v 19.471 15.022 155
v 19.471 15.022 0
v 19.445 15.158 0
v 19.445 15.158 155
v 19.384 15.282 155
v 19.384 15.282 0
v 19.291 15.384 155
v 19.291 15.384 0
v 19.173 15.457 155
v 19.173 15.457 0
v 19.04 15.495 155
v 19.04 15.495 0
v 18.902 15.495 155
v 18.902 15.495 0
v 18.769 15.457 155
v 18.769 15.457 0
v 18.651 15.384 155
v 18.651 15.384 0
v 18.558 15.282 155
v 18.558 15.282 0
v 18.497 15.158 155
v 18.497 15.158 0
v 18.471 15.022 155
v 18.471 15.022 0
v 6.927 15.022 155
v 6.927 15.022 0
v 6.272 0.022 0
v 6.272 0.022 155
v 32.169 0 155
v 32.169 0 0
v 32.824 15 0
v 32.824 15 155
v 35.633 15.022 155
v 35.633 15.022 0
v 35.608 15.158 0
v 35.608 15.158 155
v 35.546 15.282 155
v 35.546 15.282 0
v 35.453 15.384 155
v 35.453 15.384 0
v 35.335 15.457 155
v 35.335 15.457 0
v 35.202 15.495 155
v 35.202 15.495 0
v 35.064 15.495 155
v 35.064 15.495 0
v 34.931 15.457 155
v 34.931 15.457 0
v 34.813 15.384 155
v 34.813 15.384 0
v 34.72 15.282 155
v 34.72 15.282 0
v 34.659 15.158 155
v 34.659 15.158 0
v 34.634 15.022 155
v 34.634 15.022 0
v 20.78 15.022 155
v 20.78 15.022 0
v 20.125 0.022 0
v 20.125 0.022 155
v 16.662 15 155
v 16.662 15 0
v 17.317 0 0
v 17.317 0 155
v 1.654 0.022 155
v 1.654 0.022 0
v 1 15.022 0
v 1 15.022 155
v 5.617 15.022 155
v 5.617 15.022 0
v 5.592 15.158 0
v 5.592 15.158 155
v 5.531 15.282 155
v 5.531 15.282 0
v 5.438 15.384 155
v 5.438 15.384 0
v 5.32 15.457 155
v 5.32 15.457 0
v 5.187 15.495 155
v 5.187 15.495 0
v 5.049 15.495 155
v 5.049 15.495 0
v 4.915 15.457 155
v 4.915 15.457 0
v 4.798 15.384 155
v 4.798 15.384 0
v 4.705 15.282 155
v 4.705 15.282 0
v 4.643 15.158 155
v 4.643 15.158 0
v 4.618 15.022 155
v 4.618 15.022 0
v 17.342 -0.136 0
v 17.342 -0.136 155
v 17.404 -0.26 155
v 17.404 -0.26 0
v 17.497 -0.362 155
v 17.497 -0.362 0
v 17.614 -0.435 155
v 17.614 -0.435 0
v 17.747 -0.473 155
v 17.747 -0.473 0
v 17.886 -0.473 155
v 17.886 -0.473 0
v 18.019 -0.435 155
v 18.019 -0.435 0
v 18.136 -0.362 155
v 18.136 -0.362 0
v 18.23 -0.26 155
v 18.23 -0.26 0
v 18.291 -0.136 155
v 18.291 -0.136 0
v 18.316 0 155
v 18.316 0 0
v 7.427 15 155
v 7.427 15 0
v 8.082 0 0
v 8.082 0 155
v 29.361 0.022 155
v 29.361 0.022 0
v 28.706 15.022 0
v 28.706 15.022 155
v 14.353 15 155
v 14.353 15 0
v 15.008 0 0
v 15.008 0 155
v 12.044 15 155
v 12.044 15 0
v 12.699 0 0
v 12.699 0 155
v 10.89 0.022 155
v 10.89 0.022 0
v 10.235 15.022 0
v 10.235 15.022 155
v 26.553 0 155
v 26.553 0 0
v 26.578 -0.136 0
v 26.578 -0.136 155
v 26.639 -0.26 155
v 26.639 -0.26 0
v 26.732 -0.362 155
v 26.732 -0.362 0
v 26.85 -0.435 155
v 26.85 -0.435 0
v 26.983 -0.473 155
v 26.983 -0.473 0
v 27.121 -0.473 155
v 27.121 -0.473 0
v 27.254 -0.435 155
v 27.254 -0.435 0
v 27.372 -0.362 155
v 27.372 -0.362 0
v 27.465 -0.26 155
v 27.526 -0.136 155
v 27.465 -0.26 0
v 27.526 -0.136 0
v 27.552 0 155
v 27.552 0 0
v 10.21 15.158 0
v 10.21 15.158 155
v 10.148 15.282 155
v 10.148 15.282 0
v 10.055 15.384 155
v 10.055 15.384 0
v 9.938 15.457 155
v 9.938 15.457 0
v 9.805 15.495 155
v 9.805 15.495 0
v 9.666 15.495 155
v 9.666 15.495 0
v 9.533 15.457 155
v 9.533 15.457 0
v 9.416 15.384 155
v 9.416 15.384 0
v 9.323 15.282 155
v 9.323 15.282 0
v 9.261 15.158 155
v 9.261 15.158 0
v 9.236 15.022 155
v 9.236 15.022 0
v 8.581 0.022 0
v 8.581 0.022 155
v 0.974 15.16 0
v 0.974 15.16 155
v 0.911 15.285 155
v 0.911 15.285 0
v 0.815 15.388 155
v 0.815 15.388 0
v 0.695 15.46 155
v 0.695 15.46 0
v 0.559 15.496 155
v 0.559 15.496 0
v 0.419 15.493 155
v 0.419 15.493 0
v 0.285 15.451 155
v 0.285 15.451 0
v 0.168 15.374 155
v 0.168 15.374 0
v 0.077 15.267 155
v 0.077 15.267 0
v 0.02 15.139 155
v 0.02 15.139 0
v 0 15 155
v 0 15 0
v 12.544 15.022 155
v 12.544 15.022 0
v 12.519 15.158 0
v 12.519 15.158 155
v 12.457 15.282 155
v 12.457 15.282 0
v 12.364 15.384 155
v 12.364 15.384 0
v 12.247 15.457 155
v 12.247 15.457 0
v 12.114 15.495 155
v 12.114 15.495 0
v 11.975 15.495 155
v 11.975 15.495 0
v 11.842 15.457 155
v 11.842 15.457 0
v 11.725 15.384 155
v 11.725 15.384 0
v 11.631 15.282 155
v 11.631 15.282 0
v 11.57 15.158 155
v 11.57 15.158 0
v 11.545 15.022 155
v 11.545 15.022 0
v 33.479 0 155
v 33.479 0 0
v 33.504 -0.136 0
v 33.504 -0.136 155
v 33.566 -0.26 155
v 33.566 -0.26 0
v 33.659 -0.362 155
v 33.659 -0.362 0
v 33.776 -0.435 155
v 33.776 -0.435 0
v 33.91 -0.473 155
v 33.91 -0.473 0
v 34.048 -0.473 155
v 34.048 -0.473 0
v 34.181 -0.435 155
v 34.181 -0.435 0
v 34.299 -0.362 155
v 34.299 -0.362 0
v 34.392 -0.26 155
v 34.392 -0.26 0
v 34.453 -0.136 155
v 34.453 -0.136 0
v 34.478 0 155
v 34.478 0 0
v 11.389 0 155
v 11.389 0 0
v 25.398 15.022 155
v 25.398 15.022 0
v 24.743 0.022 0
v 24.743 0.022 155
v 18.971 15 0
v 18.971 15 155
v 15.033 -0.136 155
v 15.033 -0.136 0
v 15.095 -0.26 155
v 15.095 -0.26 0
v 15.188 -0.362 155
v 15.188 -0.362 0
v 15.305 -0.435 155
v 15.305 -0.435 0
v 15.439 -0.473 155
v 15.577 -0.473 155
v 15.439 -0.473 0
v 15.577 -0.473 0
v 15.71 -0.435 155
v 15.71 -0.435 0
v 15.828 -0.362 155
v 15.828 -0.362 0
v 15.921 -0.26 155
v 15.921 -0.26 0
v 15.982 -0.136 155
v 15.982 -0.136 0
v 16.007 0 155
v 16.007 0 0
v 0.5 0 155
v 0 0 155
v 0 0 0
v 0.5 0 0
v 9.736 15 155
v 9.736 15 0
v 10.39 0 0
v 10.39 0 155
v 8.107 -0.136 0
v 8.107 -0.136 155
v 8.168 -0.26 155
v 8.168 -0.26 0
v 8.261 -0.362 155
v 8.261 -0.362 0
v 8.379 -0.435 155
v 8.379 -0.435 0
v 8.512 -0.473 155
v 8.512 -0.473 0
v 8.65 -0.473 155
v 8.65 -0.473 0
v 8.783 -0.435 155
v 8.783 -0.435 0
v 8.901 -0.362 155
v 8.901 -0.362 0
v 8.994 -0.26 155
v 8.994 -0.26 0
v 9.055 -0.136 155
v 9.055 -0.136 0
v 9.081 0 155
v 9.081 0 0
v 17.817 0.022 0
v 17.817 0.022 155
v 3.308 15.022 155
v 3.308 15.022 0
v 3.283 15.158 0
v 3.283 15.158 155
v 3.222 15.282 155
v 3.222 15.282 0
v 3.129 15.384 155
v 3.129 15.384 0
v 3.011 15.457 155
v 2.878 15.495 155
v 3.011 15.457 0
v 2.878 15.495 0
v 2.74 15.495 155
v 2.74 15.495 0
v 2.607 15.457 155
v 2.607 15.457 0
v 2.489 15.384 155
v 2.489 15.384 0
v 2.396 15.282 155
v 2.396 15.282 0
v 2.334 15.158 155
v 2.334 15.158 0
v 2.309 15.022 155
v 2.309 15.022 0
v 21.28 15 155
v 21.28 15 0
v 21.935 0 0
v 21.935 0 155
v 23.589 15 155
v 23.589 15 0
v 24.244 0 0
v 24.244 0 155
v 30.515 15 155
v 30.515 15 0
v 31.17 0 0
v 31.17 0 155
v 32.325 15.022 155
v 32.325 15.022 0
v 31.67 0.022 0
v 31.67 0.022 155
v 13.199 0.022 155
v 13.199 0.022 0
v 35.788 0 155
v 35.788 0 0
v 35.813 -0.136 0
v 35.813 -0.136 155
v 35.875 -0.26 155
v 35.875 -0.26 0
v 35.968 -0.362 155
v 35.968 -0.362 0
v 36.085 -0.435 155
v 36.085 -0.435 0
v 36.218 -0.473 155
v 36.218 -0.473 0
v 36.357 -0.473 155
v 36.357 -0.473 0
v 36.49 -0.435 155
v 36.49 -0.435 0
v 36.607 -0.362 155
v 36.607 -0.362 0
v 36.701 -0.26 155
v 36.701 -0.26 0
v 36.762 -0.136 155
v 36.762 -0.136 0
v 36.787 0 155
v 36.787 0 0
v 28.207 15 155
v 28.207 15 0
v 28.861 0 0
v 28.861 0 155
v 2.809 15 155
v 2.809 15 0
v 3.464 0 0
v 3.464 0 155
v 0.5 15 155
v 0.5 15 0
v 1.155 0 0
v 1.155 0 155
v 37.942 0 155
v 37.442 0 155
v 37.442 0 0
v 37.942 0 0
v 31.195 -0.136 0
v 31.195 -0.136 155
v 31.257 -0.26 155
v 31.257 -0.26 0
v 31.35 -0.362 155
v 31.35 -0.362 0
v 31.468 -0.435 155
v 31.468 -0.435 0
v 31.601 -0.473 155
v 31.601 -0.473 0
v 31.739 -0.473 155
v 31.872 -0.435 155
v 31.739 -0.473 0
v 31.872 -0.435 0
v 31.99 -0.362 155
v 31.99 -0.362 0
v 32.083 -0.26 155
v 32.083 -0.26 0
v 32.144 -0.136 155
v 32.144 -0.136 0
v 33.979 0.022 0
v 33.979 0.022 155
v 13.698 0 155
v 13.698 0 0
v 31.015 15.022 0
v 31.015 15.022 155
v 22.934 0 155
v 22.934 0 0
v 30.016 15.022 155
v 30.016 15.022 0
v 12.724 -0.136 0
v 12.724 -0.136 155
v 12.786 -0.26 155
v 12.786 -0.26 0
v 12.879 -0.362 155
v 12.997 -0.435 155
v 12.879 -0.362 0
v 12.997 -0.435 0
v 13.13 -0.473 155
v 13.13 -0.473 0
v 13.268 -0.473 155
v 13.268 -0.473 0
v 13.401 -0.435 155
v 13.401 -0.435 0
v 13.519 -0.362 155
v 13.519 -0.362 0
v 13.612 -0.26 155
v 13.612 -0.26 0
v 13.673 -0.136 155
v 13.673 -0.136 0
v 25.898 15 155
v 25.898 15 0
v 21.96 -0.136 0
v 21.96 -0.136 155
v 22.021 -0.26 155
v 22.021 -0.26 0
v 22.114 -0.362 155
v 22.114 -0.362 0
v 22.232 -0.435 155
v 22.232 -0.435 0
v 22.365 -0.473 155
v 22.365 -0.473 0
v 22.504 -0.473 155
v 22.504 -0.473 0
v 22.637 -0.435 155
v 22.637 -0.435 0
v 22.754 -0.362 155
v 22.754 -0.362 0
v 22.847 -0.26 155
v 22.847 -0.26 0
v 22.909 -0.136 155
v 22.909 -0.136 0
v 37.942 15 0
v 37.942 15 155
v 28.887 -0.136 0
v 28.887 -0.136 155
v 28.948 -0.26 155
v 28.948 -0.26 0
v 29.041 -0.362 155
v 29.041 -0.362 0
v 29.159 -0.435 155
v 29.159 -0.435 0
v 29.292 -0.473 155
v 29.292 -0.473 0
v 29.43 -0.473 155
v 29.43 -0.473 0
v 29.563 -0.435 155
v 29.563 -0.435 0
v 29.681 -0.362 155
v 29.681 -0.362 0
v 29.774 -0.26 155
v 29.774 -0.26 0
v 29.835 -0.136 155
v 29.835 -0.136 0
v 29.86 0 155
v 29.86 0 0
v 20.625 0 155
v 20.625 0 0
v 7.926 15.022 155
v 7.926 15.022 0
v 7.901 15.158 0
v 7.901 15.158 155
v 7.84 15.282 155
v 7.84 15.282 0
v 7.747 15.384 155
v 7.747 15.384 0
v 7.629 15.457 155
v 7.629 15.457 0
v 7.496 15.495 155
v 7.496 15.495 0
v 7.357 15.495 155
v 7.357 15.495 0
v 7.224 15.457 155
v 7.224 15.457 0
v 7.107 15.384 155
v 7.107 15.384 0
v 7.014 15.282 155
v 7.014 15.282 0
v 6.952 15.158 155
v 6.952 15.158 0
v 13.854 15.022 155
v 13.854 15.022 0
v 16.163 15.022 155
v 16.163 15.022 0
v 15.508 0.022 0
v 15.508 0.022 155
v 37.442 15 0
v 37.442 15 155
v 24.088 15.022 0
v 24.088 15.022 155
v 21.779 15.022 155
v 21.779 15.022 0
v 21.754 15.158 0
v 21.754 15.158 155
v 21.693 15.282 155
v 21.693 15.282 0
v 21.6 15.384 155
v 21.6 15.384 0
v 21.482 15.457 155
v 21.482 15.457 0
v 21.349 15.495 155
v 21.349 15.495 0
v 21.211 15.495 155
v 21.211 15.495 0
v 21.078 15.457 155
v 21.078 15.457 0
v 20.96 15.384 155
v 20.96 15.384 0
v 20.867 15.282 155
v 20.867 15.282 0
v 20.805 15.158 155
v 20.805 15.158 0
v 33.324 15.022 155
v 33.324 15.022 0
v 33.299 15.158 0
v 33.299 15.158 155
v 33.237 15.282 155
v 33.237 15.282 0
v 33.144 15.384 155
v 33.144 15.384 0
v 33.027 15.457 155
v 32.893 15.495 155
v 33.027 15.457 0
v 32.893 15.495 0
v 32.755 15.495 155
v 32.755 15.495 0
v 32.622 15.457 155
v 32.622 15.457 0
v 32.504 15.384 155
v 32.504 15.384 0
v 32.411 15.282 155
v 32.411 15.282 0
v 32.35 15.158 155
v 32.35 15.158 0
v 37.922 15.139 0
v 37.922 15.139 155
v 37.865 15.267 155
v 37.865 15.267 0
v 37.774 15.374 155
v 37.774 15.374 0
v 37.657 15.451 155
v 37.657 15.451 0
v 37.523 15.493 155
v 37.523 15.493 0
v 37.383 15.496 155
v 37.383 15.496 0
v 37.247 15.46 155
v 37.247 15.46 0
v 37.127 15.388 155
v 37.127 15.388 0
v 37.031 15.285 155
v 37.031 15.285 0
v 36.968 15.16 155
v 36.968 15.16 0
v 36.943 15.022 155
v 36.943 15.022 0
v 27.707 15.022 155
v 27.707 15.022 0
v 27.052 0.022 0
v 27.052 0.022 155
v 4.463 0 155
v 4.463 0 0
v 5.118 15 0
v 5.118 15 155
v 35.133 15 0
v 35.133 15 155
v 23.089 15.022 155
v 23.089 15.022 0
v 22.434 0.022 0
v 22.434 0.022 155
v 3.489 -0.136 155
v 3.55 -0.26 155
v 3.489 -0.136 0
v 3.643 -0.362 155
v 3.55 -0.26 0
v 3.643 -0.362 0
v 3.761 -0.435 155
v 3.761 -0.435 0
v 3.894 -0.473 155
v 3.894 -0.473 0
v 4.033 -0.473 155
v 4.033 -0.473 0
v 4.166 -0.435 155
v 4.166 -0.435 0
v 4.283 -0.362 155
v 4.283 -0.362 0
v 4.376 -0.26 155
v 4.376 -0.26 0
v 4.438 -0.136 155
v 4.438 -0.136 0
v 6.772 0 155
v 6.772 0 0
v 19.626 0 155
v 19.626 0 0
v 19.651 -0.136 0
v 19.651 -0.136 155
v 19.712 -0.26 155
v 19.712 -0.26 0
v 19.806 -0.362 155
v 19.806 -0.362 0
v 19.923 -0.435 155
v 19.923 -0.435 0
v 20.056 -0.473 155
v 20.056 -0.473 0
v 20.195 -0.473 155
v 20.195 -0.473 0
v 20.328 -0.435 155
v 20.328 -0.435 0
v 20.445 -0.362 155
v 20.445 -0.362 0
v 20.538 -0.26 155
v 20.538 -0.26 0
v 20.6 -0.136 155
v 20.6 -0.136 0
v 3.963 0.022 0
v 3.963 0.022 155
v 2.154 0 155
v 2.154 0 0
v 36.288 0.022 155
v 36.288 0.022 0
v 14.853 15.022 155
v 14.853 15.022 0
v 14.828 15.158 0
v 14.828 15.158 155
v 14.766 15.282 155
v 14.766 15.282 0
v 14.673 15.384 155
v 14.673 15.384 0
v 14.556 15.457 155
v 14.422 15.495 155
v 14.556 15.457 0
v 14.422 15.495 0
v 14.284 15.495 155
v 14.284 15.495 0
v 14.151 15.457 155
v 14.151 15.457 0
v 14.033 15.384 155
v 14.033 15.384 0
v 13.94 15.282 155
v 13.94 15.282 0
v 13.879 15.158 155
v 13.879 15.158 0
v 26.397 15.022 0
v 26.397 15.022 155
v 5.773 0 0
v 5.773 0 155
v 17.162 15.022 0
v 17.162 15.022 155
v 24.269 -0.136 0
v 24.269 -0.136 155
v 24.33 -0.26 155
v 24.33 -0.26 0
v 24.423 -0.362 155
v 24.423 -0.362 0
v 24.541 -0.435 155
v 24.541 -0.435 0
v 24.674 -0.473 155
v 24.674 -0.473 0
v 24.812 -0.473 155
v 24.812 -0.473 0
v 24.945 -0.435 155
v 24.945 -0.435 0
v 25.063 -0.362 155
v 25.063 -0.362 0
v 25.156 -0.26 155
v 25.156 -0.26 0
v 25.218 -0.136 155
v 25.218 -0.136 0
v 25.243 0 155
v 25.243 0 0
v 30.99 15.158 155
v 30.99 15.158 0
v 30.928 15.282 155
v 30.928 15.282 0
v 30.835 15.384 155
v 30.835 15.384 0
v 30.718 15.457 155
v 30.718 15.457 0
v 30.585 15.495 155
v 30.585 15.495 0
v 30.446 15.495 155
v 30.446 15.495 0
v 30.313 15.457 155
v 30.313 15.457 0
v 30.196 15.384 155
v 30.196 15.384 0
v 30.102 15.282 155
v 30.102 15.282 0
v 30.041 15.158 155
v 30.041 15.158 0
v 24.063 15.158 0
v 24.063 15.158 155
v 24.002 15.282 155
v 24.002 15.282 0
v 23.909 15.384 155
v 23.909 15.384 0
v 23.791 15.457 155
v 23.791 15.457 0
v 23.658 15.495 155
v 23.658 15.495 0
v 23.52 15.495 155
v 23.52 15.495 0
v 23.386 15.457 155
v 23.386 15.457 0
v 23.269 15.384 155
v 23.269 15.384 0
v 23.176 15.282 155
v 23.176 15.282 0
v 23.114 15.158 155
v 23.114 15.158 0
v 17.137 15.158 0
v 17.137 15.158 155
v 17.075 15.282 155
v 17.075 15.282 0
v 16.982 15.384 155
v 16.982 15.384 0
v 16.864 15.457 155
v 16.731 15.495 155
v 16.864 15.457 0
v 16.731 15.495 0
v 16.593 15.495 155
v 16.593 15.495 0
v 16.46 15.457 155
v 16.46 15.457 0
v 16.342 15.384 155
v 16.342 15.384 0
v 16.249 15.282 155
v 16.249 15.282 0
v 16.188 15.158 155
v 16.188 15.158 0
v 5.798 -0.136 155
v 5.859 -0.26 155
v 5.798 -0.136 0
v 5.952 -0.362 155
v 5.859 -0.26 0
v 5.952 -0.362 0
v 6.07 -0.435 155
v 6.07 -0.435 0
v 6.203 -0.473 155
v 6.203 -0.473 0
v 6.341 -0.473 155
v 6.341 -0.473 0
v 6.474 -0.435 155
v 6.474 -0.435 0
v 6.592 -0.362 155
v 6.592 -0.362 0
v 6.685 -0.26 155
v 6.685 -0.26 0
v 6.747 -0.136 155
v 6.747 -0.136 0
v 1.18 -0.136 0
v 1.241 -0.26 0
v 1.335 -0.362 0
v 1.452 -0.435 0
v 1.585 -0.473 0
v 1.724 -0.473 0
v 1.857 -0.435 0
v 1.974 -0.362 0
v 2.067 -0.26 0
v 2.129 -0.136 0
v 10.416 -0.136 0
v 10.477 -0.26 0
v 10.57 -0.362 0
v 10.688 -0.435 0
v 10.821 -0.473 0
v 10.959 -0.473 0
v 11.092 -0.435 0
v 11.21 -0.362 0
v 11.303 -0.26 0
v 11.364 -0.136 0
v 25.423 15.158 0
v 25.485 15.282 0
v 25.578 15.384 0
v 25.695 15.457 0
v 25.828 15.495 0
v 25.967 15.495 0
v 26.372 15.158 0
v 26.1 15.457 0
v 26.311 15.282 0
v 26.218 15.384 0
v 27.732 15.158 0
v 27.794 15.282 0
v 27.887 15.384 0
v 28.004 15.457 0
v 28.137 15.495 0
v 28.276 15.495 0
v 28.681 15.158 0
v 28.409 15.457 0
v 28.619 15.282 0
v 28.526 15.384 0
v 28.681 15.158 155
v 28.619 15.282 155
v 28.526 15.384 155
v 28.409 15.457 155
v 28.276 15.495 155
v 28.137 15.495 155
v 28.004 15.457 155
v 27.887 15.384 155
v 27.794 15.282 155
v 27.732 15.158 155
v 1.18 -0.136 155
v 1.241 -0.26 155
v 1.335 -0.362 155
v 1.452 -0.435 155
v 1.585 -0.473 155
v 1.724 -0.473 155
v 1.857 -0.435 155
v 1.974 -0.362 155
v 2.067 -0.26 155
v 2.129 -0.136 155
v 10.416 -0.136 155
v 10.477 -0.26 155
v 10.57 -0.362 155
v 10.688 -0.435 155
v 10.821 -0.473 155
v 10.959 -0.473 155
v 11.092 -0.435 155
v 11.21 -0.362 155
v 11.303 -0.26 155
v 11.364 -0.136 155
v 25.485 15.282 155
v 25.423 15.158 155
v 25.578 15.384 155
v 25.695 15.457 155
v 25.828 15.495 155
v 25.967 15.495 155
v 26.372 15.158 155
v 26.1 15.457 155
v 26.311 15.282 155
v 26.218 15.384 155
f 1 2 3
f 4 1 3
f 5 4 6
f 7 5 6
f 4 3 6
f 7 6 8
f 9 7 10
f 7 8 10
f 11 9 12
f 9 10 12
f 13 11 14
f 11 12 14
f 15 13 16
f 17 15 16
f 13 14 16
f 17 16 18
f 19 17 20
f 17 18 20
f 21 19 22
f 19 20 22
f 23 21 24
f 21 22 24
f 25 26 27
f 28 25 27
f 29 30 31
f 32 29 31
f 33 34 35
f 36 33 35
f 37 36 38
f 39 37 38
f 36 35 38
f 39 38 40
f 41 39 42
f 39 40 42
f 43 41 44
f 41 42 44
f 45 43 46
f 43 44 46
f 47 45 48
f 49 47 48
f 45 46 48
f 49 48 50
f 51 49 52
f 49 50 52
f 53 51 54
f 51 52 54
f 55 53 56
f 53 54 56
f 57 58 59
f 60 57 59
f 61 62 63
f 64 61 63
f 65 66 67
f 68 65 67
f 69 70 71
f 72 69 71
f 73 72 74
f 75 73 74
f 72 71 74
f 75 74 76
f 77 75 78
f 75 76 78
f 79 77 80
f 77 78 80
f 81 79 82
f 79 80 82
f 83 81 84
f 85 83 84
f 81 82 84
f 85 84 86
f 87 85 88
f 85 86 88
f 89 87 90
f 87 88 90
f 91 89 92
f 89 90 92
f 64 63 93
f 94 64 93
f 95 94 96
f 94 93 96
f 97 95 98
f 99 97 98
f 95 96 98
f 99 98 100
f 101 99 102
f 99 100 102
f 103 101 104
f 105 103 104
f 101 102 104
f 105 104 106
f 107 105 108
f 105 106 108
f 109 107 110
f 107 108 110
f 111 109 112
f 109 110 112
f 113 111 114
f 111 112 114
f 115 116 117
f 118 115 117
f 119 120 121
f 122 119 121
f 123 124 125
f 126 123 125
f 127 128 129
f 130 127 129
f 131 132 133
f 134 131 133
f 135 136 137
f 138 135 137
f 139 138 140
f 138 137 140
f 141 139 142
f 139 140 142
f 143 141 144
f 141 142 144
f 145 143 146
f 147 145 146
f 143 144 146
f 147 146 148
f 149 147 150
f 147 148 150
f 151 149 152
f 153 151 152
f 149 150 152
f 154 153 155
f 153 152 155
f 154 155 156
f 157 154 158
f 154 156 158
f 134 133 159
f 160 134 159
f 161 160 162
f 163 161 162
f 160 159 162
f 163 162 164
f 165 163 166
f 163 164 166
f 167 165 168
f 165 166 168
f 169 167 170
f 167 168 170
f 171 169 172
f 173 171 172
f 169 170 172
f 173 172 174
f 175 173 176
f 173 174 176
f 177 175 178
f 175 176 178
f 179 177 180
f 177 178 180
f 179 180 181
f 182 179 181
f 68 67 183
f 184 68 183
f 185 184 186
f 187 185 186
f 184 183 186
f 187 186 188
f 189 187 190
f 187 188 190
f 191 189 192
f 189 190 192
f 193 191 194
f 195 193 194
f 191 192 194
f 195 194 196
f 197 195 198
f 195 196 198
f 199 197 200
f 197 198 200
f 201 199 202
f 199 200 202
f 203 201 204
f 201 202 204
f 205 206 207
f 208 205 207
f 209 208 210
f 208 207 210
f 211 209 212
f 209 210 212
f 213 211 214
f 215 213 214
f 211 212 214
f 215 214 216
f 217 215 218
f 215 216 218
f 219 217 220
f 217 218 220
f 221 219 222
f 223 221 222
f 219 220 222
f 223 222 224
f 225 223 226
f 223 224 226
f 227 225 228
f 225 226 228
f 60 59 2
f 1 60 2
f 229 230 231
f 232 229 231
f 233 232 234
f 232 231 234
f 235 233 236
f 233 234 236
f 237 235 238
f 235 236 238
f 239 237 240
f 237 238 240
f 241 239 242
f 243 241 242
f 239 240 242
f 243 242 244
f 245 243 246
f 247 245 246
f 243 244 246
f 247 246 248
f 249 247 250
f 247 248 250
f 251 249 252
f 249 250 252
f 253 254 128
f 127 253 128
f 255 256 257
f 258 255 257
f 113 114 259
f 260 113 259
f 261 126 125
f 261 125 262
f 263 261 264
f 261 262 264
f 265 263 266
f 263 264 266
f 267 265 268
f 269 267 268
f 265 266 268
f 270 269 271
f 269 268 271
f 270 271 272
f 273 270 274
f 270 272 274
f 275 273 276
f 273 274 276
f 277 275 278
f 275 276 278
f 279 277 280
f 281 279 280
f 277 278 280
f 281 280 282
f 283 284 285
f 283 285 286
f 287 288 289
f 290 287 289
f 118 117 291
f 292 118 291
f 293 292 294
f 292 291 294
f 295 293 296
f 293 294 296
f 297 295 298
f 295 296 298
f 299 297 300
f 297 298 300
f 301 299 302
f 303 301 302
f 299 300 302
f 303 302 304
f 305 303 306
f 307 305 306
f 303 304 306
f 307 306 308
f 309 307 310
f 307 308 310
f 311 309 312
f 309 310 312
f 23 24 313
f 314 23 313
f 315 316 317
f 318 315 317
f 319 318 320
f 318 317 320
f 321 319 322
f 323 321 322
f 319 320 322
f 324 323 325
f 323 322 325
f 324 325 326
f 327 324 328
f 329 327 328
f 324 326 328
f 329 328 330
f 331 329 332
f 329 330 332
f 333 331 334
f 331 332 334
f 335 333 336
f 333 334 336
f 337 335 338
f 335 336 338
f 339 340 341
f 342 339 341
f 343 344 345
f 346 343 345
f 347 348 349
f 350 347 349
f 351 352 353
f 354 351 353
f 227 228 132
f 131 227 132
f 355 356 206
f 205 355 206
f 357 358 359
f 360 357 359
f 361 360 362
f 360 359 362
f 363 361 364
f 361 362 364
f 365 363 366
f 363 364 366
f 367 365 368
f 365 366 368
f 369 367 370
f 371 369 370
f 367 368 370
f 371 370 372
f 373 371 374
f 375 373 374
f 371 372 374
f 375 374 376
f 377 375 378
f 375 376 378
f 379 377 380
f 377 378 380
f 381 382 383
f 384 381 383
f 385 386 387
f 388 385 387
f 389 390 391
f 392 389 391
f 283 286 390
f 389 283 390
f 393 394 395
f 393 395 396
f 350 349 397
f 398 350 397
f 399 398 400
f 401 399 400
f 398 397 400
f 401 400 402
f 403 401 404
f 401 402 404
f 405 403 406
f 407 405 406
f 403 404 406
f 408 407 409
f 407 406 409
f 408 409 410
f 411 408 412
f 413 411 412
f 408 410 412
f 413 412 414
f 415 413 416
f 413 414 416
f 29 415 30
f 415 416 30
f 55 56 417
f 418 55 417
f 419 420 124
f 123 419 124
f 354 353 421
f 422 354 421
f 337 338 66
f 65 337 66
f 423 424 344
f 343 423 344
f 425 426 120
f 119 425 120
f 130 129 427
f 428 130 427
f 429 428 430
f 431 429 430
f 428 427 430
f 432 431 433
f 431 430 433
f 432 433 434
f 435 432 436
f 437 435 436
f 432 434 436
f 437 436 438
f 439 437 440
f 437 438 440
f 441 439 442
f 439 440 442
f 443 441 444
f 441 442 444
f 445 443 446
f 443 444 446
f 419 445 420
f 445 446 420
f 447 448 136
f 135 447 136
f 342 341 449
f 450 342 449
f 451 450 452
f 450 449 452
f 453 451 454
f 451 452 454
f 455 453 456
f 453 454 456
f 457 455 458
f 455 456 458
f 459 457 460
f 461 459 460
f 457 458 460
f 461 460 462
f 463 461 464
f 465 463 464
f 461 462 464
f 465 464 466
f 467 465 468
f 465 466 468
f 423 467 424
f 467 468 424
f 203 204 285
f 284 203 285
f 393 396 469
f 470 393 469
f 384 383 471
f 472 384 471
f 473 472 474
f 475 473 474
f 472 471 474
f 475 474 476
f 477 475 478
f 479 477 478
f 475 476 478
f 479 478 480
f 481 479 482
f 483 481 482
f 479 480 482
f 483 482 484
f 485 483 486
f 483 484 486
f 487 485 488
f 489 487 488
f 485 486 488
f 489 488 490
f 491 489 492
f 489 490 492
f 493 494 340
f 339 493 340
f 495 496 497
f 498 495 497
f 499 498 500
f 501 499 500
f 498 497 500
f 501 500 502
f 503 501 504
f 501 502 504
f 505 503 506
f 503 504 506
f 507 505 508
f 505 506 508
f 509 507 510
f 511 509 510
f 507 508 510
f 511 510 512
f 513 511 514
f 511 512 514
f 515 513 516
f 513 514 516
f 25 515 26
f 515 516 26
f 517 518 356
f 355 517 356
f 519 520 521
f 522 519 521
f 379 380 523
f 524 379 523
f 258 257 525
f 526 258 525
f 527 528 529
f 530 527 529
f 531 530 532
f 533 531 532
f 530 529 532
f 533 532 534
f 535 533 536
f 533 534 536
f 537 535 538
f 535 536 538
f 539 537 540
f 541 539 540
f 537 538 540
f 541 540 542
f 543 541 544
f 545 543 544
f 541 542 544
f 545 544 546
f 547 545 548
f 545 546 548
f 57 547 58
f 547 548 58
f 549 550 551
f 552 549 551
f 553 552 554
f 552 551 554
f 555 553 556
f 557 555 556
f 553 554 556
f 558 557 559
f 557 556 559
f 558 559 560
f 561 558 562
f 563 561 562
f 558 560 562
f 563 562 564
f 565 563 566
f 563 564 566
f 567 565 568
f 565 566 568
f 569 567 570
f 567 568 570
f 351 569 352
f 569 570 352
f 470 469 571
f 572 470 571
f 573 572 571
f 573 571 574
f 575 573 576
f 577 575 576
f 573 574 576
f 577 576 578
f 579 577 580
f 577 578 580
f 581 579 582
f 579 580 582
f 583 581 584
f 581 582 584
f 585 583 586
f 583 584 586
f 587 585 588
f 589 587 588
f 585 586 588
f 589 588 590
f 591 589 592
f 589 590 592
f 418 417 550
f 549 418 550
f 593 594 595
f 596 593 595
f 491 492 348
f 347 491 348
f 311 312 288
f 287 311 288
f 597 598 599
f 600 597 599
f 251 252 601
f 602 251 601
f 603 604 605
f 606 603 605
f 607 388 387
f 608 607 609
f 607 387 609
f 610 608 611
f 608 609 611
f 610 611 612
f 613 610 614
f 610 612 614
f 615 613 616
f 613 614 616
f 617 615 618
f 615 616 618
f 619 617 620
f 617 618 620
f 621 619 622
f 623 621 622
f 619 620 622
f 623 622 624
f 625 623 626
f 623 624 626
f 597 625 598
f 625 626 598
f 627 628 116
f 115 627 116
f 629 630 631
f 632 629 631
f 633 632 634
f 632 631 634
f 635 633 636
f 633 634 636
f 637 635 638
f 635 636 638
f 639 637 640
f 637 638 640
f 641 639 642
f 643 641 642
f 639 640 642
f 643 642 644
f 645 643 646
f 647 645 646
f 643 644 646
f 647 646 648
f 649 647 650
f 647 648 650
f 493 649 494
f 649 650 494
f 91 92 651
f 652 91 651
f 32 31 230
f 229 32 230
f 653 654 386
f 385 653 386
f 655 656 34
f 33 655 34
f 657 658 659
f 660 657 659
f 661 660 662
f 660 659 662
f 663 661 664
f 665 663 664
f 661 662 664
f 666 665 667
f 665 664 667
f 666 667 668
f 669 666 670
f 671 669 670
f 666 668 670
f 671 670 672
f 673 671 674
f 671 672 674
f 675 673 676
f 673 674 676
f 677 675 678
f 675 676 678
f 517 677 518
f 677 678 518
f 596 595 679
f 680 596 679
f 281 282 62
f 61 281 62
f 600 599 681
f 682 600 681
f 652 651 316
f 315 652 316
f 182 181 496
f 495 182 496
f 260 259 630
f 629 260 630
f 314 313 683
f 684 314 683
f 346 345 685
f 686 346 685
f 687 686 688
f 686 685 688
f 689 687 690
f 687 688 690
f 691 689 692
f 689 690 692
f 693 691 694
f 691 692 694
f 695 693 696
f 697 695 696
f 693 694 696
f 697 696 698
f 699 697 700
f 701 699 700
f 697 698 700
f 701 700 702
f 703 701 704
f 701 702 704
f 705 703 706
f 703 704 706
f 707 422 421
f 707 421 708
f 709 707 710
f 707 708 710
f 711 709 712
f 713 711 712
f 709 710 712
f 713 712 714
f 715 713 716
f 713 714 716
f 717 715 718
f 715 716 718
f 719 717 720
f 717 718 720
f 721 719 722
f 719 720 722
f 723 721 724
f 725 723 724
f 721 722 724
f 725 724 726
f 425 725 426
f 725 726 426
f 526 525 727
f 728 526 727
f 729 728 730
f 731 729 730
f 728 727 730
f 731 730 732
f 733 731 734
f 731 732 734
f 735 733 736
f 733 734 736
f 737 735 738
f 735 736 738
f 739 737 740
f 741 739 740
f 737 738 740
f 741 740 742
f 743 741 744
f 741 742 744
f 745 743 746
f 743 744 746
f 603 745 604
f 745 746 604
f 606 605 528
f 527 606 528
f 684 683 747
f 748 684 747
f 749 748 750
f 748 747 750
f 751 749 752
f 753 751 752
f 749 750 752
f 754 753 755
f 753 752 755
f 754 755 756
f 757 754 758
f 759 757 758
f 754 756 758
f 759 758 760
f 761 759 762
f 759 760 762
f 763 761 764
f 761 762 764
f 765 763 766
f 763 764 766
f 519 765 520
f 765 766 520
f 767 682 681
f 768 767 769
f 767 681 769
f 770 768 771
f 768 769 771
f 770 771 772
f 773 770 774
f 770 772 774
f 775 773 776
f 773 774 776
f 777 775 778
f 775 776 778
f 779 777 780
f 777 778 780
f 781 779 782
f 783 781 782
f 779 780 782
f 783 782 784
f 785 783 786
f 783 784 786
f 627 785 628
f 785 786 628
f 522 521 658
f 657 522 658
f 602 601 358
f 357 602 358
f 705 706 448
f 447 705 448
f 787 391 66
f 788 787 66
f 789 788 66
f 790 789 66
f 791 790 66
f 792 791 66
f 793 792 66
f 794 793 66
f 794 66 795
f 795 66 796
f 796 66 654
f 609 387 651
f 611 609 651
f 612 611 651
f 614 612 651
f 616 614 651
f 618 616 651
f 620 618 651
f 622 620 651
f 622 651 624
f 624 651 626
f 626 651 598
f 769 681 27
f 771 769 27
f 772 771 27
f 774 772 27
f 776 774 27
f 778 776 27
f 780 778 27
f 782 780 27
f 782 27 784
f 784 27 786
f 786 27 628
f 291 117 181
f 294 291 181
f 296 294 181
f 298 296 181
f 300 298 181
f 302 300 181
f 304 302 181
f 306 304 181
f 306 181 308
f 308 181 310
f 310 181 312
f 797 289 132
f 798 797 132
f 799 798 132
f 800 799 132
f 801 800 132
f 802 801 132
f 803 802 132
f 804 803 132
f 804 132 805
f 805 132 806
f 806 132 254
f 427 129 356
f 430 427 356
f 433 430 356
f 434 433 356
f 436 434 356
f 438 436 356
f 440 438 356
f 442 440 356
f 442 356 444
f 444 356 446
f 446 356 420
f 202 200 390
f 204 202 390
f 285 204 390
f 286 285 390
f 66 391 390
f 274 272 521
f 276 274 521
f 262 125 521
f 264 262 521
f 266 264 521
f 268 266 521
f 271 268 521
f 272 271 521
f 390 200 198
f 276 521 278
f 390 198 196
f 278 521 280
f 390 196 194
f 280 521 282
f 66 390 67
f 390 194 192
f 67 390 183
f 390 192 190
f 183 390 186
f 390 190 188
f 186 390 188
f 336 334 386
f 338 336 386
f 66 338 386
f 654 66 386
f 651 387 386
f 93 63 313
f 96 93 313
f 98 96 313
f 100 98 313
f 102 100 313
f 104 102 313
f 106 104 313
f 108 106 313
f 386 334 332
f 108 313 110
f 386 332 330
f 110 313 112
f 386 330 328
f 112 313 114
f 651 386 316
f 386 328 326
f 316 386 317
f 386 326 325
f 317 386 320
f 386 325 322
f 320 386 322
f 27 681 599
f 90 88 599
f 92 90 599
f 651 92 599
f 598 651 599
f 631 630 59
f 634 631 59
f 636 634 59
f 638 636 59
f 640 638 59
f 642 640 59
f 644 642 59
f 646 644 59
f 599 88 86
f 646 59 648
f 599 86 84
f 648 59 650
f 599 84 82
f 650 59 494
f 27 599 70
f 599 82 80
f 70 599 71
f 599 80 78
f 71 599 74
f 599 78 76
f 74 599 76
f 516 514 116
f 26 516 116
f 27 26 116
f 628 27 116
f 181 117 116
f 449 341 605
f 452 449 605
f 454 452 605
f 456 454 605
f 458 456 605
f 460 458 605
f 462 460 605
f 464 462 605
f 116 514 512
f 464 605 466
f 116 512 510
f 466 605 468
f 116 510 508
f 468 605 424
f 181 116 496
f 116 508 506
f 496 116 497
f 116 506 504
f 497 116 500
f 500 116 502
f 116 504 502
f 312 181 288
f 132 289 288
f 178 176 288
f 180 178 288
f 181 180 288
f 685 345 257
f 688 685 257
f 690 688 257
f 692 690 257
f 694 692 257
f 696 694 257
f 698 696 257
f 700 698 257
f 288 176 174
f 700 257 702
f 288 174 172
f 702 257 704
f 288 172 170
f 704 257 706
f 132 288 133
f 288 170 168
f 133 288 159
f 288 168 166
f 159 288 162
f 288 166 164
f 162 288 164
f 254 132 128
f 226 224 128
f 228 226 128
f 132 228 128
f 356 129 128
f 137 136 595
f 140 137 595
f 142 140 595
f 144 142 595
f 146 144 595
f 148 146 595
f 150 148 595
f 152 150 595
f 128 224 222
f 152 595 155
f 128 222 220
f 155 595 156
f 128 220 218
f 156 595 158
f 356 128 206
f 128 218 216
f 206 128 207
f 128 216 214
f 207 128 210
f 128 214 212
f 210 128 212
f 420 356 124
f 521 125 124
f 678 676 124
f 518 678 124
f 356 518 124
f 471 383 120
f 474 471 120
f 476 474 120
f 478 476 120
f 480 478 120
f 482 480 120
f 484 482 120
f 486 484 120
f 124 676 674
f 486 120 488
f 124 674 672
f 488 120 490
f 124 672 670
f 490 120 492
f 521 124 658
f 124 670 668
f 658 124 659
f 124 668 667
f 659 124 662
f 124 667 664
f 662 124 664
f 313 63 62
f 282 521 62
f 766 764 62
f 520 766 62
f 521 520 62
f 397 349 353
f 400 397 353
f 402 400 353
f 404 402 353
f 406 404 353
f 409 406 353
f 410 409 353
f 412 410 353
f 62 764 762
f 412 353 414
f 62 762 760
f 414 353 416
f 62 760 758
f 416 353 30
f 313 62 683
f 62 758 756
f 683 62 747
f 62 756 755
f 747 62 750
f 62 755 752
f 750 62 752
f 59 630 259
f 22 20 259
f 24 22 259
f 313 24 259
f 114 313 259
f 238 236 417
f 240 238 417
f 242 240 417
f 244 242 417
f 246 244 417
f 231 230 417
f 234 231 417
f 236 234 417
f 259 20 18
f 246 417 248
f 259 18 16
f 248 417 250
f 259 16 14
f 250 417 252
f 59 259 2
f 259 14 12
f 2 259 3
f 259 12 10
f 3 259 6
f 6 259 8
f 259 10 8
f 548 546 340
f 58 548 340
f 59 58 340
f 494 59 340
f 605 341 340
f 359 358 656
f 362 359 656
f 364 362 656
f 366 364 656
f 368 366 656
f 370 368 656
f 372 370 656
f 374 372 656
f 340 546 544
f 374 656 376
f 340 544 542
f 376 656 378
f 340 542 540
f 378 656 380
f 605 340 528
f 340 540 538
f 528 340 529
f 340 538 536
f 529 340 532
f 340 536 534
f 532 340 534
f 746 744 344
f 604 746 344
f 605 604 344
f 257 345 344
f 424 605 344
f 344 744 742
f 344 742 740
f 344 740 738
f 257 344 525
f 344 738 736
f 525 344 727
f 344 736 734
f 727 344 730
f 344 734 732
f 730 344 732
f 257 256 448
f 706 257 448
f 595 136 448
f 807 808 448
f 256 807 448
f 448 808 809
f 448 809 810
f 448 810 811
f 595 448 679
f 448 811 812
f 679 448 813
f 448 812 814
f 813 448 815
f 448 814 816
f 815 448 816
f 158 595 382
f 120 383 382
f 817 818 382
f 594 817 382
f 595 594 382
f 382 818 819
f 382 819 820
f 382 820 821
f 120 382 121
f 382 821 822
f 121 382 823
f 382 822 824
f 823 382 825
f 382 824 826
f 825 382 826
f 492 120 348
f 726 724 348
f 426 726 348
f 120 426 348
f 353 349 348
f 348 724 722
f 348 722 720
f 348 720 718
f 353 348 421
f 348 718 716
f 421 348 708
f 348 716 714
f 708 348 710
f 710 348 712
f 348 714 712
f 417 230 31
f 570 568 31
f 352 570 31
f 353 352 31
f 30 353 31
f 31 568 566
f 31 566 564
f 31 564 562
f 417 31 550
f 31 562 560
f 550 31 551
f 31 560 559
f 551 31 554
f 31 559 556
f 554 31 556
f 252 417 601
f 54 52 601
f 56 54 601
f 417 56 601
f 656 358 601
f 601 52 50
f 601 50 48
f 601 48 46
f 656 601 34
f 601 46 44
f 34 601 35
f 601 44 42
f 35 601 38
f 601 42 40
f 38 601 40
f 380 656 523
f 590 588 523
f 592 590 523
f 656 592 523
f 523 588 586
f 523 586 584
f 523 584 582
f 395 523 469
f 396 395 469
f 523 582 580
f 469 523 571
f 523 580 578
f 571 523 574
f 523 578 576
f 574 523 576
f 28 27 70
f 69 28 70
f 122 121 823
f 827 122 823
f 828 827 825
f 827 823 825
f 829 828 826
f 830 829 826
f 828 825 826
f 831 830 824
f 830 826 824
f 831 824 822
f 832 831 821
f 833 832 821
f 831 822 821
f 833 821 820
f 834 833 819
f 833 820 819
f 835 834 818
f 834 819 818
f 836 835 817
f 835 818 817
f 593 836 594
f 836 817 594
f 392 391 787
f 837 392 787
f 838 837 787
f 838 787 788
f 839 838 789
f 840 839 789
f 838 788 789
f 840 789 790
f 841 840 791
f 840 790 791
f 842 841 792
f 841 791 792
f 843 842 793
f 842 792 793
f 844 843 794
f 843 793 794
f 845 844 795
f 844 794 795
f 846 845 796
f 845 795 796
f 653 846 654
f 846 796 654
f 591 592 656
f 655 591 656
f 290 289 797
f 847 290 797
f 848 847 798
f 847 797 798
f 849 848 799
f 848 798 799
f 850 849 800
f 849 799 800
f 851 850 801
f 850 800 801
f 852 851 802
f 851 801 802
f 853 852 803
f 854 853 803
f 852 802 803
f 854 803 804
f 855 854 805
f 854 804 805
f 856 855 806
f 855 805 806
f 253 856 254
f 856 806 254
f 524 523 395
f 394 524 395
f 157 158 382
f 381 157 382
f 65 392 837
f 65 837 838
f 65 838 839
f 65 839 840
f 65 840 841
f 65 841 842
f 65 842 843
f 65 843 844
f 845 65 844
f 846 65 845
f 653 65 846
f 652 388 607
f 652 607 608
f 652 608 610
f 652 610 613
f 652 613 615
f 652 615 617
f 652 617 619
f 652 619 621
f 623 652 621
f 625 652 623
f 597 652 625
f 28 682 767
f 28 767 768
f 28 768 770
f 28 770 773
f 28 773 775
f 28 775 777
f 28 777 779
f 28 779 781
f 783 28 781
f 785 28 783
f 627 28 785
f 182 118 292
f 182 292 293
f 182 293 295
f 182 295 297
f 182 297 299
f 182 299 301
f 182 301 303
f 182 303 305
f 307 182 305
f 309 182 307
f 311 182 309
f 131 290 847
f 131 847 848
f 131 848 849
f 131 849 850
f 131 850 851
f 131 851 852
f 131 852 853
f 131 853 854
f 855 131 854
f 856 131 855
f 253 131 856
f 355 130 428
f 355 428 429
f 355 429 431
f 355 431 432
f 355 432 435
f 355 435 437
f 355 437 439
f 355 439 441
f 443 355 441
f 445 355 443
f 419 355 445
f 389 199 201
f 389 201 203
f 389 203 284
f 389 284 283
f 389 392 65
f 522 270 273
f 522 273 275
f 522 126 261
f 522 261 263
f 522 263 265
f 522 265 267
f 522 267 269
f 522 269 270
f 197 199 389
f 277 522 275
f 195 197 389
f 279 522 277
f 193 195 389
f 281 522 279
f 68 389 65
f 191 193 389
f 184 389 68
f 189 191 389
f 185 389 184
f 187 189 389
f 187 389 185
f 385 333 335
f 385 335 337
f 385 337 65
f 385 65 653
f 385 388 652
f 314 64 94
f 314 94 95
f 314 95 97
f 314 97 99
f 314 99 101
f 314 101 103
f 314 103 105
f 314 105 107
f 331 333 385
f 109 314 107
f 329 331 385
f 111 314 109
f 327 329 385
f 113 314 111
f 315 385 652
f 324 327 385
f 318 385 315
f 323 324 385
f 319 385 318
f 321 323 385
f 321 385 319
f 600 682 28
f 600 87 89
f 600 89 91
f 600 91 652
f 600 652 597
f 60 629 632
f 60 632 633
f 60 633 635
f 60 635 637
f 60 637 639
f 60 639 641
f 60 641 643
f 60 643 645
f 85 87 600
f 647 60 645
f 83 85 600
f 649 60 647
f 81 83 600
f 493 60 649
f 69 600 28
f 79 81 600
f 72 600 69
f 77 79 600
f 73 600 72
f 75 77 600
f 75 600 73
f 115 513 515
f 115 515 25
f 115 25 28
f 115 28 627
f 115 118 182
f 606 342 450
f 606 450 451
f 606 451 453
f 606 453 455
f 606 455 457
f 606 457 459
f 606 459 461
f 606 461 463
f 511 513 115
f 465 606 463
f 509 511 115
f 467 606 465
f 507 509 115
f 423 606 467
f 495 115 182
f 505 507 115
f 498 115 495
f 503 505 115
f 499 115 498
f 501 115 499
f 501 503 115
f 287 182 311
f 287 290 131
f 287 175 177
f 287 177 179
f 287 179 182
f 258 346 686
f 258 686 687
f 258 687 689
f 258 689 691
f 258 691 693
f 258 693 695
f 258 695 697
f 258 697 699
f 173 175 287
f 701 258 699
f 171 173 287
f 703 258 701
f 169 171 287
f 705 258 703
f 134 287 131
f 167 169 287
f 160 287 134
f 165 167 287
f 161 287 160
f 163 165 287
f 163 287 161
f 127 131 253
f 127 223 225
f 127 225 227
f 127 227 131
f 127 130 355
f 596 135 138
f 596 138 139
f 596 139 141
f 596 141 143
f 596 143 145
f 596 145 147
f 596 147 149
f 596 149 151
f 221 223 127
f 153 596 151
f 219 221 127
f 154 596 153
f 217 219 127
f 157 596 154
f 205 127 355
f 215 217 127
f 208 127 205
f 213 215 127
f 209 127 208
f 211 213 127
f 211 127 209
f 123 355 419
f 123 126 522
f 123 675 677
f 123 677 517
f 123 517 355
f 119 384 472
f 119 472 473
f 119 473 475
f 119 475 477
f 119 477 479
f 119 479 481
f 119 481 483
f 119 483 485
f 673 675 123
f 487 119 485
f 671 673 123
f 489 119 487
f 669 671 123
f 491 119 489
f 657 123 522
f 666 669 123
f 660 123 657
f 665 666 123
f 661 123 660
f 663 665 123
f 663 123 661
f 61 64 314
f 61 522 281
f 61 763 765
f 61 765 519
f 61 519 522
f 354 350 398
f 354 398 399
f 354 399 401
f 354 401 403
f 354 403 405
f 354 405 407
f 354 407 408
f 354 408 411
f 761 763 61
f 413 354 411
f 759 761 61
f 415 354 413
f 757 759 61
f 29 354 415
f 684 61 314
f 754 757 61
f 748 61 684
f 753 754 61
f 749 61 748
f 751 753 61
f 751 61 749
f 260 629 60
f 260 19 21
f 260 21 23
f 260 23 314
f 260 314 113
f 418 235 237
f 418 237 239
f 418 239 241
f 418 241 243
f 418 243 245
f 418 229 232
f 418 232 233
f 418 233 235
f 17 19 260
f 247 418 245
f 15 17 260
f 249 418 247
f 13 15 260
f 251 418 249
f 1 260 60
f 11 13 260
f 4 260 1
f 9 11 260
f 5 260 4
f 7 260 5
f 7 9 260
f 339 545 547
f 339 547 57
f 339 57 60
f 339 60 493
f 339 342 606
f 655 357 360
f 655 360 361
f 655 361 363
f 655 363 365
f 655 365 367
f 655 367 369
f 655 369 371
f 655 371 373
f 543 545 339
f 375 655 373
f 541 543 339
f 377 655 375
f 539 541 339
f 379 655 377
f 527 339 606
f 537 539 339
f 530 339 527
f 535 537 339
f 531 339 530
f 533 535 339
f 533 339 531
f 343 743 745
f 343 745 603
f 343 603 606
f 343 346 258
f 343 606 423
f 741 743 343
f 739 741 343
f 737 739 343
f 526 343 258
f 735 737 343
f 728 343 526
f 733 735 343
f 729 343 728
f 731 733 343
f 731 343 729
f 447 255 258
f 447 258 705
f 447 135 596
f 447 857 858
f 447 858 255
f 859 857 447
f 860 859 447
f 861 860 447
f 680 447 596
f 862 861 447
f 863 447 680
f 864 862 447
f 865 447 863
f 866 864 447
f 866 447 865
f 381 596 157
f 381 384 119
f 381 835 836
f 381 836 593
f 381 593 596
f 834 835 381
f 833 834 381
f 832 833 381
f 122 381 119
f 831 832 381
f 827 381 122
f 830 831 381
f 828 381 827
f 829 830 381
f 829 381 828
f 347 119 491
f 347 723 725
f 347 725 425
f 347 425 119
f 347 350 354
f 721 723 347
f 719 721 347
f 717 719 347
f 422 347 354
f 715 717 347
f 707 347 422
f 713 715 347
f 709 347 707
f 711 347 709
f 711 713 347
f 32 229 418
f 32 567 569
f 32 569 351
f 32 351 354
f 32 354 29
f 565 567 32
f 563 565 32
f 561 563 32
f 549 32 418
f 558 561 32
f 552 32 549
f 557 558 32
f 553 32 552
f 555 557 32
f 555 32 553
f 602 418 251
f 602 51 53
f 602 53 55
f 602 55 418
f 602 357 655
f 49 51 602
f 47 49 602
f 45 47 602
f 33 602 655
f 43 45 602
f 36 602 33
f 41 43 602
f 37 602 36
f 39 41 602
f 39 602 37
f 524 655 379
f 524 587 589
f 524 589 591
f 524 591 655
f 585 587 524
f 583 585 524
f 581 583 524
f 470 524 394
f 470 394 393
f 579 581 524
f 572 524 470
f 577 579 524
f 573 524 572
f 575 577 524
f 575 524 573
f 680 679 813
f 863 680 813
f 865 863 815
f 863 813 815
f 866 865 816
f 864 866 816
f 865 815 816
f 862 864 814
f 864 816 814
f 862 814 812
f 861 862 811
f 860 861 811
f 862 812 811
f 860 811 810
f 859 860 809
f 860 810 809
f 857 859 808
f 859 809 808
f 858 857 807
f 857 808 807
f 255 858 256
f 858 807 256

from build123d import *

# Parameters (mm, degrees)
EXTRUDE_4_DEPTH = 155


with BuildPart() as part:
    # 草图1 → 凸台-拉伸4 (new body)
    with BuildSketch(Plane.XY):
        with BuildLine():
            Line((1.654438254, 0.021809694), (0.999524111, 15.021809694))
            ThreePointArc((0.999524111, 15.021809694), (0.489092557, 15.499881014), (0, 15))
            Line((0, 15), (0, 0))
            Line((0, 0), (0.5, 0))
            Line((0.5, 0), (0.5, 15))
            Line((0.5, 15), (1.154914144, 0))
            ThreePointArc((1.154914144, 0), (1.654438254, -0.478190306), (2.153962365, 0))
            Line((2.153962365, 0), (2.808876509, 15))
            Line((2.808876509, 15), (3.463790652, 0))
            ThreePointArc((3.463790652, 0), (3.963314763, -0.478190306), (4.462838874, 0))
            Line((4.462838874, 0), (5.117753018, 15))
            Line((5.117753018, 15), (5.772667161, 0))
            ThreePointArc((5.772667161, 0), (6.272191272, -0.478190306), (6.771715383, 0))
            Line((6.771715383, 0), (7.426629527, 15))
            Line((7.426629527, 15), (8.08154367, 0))
            ThreePointArc((8.08154367, 0), (8.581067781, -0.478190306), (9.080591892, 0))
            Line((9.080591892, 0), (9.735506035, 15))
            Line((9.735506035, 15), (10.390420179, 0))
            ThreePointArc((10.390420179, 0), (10.88994429, -0.478190306), (11.389468401, 0))
            Line((11.389468401, 0), (12.044382544, 15))
            Line((12.044382544, 15), (12.699296688, 0))
            ThreePointArc((12.699296688, 0), (13.198820799, -0.478190306), (13.698344909, 0))
            Line((13.698344909, 0), (14.353259053, 15))
            Line((14.353259053, 15), (15.008173197, 0))
            ThreePointArc((15.008173197, 0), (15.507697307, -0.478190306), (16.007221418, 0))
            Line((16.007221418, 0), (16.662135562, 15))
            Line((16.662135562, 15), (17.317049705, 0))
            ThreePointArc((17.317049705, 0), (17.816573816, -0.478190306), (18.316097927, 0))
            Line((18.316097927, 0), (18.971012071, 15))
            Line((18.971012071, 15), (19.625926214, 0))
            ThreePointArc((19.625926214, 0), (20.125450325, -0.478190306), (20.624974436, 0))
            Line((20.624974436, 0), (21.27988858, 15))
            Line((21.27988858, 15), (21.934802723, 0))
            ThreePointArc((21.934802723, 0), (22.434326834, -0.478190306), (22.933850945, 0))
            Line((22.933850945, 0), (23.588765088, 15))
            Line((23.588765088, 15), (24.243679232, 0))
            ThreePointArc((24.243679232, 0), (24.743203343, -0.478190306), (25.242727454, 0))
            Line((25.242727454, 0), (25.897641597, 15))
            Line((25.897641597, 15), (26.552555741, 0))
            ThreePointArc((26.552555741, 0), (27.052079852, -0.478190306), (27.551603962, 0))
            Line((27.551603962, 0), (28.206518106, 15))
            Line((28.206518106, 15), (28.86143225, 0))
            ThreePointArc((28.86143225, 0), (29.36095636, -0.478190306), (29.860480471, 0))
            Line((29.860480471, 0), (30.515394615, 15))
            Line((30.515394615, 15), (31.170308759, 0))
            ThreePointArc((31.170308759, 0), (31.669832869, -0.478190306), (32.16935698, 0))
            Line((32.16935698, 0), (32.824271124, 15))
            Line((32.824271124, 15), (33.479185267, 0))
            ThreePointArc((33.479185267, 0), (33.978709378, -0.478190306), (34.478233489, 0))
            Line((34.478233489, 0), (35.133147633, 15))
            Line((35.133147633, 15), (35.788061776, 0))
            ThreePointArc((35.788061776, 0), (36.287585887, -0.478190306), (36.787109998, 0))
            Line((36.787109998, 0), (37.442024141, 15))
            Line((37.442024141, 15), (37.442024141, 0))
            Line((37.442024141, 0), (37.942024141, 0))
            Line((37.942024141, 0), (37.942024141, 15))
            ThreePointArc((37.942024141, 15), (37.452931584, 15.499881014), (36.942500031, 15.021809694))
            Line((36.942500031, 15.021809694), (36.287585887, 0.021809694))
            Line((36.287585887, 0.021809694), (35.632671743, 15.021809694))
            ThreePointArc((35.632671743, 15.021809694), (35.133147633, 15.5), (34.633623522, 15.021809694))
            Line((34.633623522, 15.021809694), (33.978709378, 0.021809694))
            Line((33.978709378, 0.021809694), (33.323795235, 15.021809694))
            ThreePointArc((33.323795235, 15.021809694), (32.824271124, 15.5), (32.324747013, 15.021809694))
            Line((32.324747013, 15.021809694), (31.669832869, 0.021809694))
            Line((31.669832869, 0.021809694), (31.014918726, 15.021809694))
            ThreePointArc((31.014918726, 15.021809694), (30.515394615, 15.5), (30.015870504, 15.021809694))
            Line((30.015870504, 15.021809694), (29.36095636, 0.021809694))
            Line((29.36095636, 0.021809694), (28.706042217, 15.021809694))
            ThreePointArc((28.706042217, 15.021809694), (28.206518106, 15.5), (27.706993995, 15.021809694))
            Line((27.706993995, 15.021809694), (27.052079852, 0.021809694))
            Line((27.052079852, 0.021809694), (26.397165708, 15.021809694))
            ThreePointArc((26.397165708, 15.021809694), (25.897641597, 15.5), (25.398117486, 15.021809694))
            Line((25.398117486, 15.021809694), (24.743203343, 0.021809694))
            Line((24.743203343, 0.021809694), (24.088289199, 15.021809694))
            ThreePointArc((24.088289199, 15.021809694), (23.588765088, 15.5), (23.089240978, 15.021809694))
            Line((23.089240978, 15.021809694), (22.434326834, 0.021809694))
            Line((22.434326834, 0.021809694), (21.77941269, 15.021809694))
            ThreePointArc((21.77941269, 15.021809694), (21.27988858, 15.5), (20.780364469, 15.021809694))
            Line((20.780364469, 15.021809694), (20.125450325, 0.021809694))
            Line((20.125450325, 0.021809694), (19.470536181, 15.021809694))
            ThreePointArc((19.470536181, 15.021809694), (18.971012071, 15.5), (18.47148796, 15.021809694))
            Line((18.47148796, 15.021809694), (17.816573816, 0.021809694))
            Line((17.816573816, 0.021809694), (17.161659673, 15.021809694))
            ThreePointArc((17.161659673, 15.021809694), (16.662135562, 15.5), (16.162611451, 15.021809694))
            Line((16.162611451, 15.021809694), (15.507697307, 0.021809694))
            Line((15.507697307, 0.021809694), (14.852783164, 15.021809694))
            ThreePointArc((14.852783164, 15.021809694), (14.353259053, 15.5), (13.853734942, 15.021809694))
            Line((13.853734942, 15.021809694), (13.198820799, 0.021809694))
            Line((13.198820799, 0.021809694), (12.543906655, 15.021809694))
            ThreePointArc((12.543906655, 15.021809694), (12.044382544, 15.5), (11.544858433, 15.021809694))
            Line((11.544858433, 15.021809694), (10.88994429, 0.021809694))
            Line((10.88994429, 0.021809694), (10.235030146, 15.021809694))
            ThreePointArc((10.235030146, 15.021809694), (9.735506035, 15.5), (9.235981925, 15.021809694))
            Line((9.235981925, 15.021809694), (8.581067781, 0.021809694))
            Line((8.581067781, 0.021809694), (7.926153637, 15.021809694))
            ThreePointArc((7.926153637, 15.021809694), (7.426629527, 15.5), (6.927105416, 15.021809694))
            Line((6.927105416, 15.021809694), (6.272191272, 0.021809694))
            Line((6.272191272, 0.021809694), (5.617277128, 15.021809694))
            ThreePointArc((5.617277128, 15.021809694), (5.117753018, 15.5), (4.618228907, 15.021809694))
            Line((4.618228907, 15.021809694), (3.963314763, 0.021809694))
            Line((3.963314763, 0.021809694), (3.30840062, 15.021809694))
            ThreePointArc((3.30840062, 15.021809694), (2.808876509, 15.5), (2.309352398, 15.021809694))
            Line((2.309352398, 15.021809694), (1.654438254, 0.021809694))
        make_face()
    extrude(amount=EXTRUDE_4_DEPTH)


solid = part.part
